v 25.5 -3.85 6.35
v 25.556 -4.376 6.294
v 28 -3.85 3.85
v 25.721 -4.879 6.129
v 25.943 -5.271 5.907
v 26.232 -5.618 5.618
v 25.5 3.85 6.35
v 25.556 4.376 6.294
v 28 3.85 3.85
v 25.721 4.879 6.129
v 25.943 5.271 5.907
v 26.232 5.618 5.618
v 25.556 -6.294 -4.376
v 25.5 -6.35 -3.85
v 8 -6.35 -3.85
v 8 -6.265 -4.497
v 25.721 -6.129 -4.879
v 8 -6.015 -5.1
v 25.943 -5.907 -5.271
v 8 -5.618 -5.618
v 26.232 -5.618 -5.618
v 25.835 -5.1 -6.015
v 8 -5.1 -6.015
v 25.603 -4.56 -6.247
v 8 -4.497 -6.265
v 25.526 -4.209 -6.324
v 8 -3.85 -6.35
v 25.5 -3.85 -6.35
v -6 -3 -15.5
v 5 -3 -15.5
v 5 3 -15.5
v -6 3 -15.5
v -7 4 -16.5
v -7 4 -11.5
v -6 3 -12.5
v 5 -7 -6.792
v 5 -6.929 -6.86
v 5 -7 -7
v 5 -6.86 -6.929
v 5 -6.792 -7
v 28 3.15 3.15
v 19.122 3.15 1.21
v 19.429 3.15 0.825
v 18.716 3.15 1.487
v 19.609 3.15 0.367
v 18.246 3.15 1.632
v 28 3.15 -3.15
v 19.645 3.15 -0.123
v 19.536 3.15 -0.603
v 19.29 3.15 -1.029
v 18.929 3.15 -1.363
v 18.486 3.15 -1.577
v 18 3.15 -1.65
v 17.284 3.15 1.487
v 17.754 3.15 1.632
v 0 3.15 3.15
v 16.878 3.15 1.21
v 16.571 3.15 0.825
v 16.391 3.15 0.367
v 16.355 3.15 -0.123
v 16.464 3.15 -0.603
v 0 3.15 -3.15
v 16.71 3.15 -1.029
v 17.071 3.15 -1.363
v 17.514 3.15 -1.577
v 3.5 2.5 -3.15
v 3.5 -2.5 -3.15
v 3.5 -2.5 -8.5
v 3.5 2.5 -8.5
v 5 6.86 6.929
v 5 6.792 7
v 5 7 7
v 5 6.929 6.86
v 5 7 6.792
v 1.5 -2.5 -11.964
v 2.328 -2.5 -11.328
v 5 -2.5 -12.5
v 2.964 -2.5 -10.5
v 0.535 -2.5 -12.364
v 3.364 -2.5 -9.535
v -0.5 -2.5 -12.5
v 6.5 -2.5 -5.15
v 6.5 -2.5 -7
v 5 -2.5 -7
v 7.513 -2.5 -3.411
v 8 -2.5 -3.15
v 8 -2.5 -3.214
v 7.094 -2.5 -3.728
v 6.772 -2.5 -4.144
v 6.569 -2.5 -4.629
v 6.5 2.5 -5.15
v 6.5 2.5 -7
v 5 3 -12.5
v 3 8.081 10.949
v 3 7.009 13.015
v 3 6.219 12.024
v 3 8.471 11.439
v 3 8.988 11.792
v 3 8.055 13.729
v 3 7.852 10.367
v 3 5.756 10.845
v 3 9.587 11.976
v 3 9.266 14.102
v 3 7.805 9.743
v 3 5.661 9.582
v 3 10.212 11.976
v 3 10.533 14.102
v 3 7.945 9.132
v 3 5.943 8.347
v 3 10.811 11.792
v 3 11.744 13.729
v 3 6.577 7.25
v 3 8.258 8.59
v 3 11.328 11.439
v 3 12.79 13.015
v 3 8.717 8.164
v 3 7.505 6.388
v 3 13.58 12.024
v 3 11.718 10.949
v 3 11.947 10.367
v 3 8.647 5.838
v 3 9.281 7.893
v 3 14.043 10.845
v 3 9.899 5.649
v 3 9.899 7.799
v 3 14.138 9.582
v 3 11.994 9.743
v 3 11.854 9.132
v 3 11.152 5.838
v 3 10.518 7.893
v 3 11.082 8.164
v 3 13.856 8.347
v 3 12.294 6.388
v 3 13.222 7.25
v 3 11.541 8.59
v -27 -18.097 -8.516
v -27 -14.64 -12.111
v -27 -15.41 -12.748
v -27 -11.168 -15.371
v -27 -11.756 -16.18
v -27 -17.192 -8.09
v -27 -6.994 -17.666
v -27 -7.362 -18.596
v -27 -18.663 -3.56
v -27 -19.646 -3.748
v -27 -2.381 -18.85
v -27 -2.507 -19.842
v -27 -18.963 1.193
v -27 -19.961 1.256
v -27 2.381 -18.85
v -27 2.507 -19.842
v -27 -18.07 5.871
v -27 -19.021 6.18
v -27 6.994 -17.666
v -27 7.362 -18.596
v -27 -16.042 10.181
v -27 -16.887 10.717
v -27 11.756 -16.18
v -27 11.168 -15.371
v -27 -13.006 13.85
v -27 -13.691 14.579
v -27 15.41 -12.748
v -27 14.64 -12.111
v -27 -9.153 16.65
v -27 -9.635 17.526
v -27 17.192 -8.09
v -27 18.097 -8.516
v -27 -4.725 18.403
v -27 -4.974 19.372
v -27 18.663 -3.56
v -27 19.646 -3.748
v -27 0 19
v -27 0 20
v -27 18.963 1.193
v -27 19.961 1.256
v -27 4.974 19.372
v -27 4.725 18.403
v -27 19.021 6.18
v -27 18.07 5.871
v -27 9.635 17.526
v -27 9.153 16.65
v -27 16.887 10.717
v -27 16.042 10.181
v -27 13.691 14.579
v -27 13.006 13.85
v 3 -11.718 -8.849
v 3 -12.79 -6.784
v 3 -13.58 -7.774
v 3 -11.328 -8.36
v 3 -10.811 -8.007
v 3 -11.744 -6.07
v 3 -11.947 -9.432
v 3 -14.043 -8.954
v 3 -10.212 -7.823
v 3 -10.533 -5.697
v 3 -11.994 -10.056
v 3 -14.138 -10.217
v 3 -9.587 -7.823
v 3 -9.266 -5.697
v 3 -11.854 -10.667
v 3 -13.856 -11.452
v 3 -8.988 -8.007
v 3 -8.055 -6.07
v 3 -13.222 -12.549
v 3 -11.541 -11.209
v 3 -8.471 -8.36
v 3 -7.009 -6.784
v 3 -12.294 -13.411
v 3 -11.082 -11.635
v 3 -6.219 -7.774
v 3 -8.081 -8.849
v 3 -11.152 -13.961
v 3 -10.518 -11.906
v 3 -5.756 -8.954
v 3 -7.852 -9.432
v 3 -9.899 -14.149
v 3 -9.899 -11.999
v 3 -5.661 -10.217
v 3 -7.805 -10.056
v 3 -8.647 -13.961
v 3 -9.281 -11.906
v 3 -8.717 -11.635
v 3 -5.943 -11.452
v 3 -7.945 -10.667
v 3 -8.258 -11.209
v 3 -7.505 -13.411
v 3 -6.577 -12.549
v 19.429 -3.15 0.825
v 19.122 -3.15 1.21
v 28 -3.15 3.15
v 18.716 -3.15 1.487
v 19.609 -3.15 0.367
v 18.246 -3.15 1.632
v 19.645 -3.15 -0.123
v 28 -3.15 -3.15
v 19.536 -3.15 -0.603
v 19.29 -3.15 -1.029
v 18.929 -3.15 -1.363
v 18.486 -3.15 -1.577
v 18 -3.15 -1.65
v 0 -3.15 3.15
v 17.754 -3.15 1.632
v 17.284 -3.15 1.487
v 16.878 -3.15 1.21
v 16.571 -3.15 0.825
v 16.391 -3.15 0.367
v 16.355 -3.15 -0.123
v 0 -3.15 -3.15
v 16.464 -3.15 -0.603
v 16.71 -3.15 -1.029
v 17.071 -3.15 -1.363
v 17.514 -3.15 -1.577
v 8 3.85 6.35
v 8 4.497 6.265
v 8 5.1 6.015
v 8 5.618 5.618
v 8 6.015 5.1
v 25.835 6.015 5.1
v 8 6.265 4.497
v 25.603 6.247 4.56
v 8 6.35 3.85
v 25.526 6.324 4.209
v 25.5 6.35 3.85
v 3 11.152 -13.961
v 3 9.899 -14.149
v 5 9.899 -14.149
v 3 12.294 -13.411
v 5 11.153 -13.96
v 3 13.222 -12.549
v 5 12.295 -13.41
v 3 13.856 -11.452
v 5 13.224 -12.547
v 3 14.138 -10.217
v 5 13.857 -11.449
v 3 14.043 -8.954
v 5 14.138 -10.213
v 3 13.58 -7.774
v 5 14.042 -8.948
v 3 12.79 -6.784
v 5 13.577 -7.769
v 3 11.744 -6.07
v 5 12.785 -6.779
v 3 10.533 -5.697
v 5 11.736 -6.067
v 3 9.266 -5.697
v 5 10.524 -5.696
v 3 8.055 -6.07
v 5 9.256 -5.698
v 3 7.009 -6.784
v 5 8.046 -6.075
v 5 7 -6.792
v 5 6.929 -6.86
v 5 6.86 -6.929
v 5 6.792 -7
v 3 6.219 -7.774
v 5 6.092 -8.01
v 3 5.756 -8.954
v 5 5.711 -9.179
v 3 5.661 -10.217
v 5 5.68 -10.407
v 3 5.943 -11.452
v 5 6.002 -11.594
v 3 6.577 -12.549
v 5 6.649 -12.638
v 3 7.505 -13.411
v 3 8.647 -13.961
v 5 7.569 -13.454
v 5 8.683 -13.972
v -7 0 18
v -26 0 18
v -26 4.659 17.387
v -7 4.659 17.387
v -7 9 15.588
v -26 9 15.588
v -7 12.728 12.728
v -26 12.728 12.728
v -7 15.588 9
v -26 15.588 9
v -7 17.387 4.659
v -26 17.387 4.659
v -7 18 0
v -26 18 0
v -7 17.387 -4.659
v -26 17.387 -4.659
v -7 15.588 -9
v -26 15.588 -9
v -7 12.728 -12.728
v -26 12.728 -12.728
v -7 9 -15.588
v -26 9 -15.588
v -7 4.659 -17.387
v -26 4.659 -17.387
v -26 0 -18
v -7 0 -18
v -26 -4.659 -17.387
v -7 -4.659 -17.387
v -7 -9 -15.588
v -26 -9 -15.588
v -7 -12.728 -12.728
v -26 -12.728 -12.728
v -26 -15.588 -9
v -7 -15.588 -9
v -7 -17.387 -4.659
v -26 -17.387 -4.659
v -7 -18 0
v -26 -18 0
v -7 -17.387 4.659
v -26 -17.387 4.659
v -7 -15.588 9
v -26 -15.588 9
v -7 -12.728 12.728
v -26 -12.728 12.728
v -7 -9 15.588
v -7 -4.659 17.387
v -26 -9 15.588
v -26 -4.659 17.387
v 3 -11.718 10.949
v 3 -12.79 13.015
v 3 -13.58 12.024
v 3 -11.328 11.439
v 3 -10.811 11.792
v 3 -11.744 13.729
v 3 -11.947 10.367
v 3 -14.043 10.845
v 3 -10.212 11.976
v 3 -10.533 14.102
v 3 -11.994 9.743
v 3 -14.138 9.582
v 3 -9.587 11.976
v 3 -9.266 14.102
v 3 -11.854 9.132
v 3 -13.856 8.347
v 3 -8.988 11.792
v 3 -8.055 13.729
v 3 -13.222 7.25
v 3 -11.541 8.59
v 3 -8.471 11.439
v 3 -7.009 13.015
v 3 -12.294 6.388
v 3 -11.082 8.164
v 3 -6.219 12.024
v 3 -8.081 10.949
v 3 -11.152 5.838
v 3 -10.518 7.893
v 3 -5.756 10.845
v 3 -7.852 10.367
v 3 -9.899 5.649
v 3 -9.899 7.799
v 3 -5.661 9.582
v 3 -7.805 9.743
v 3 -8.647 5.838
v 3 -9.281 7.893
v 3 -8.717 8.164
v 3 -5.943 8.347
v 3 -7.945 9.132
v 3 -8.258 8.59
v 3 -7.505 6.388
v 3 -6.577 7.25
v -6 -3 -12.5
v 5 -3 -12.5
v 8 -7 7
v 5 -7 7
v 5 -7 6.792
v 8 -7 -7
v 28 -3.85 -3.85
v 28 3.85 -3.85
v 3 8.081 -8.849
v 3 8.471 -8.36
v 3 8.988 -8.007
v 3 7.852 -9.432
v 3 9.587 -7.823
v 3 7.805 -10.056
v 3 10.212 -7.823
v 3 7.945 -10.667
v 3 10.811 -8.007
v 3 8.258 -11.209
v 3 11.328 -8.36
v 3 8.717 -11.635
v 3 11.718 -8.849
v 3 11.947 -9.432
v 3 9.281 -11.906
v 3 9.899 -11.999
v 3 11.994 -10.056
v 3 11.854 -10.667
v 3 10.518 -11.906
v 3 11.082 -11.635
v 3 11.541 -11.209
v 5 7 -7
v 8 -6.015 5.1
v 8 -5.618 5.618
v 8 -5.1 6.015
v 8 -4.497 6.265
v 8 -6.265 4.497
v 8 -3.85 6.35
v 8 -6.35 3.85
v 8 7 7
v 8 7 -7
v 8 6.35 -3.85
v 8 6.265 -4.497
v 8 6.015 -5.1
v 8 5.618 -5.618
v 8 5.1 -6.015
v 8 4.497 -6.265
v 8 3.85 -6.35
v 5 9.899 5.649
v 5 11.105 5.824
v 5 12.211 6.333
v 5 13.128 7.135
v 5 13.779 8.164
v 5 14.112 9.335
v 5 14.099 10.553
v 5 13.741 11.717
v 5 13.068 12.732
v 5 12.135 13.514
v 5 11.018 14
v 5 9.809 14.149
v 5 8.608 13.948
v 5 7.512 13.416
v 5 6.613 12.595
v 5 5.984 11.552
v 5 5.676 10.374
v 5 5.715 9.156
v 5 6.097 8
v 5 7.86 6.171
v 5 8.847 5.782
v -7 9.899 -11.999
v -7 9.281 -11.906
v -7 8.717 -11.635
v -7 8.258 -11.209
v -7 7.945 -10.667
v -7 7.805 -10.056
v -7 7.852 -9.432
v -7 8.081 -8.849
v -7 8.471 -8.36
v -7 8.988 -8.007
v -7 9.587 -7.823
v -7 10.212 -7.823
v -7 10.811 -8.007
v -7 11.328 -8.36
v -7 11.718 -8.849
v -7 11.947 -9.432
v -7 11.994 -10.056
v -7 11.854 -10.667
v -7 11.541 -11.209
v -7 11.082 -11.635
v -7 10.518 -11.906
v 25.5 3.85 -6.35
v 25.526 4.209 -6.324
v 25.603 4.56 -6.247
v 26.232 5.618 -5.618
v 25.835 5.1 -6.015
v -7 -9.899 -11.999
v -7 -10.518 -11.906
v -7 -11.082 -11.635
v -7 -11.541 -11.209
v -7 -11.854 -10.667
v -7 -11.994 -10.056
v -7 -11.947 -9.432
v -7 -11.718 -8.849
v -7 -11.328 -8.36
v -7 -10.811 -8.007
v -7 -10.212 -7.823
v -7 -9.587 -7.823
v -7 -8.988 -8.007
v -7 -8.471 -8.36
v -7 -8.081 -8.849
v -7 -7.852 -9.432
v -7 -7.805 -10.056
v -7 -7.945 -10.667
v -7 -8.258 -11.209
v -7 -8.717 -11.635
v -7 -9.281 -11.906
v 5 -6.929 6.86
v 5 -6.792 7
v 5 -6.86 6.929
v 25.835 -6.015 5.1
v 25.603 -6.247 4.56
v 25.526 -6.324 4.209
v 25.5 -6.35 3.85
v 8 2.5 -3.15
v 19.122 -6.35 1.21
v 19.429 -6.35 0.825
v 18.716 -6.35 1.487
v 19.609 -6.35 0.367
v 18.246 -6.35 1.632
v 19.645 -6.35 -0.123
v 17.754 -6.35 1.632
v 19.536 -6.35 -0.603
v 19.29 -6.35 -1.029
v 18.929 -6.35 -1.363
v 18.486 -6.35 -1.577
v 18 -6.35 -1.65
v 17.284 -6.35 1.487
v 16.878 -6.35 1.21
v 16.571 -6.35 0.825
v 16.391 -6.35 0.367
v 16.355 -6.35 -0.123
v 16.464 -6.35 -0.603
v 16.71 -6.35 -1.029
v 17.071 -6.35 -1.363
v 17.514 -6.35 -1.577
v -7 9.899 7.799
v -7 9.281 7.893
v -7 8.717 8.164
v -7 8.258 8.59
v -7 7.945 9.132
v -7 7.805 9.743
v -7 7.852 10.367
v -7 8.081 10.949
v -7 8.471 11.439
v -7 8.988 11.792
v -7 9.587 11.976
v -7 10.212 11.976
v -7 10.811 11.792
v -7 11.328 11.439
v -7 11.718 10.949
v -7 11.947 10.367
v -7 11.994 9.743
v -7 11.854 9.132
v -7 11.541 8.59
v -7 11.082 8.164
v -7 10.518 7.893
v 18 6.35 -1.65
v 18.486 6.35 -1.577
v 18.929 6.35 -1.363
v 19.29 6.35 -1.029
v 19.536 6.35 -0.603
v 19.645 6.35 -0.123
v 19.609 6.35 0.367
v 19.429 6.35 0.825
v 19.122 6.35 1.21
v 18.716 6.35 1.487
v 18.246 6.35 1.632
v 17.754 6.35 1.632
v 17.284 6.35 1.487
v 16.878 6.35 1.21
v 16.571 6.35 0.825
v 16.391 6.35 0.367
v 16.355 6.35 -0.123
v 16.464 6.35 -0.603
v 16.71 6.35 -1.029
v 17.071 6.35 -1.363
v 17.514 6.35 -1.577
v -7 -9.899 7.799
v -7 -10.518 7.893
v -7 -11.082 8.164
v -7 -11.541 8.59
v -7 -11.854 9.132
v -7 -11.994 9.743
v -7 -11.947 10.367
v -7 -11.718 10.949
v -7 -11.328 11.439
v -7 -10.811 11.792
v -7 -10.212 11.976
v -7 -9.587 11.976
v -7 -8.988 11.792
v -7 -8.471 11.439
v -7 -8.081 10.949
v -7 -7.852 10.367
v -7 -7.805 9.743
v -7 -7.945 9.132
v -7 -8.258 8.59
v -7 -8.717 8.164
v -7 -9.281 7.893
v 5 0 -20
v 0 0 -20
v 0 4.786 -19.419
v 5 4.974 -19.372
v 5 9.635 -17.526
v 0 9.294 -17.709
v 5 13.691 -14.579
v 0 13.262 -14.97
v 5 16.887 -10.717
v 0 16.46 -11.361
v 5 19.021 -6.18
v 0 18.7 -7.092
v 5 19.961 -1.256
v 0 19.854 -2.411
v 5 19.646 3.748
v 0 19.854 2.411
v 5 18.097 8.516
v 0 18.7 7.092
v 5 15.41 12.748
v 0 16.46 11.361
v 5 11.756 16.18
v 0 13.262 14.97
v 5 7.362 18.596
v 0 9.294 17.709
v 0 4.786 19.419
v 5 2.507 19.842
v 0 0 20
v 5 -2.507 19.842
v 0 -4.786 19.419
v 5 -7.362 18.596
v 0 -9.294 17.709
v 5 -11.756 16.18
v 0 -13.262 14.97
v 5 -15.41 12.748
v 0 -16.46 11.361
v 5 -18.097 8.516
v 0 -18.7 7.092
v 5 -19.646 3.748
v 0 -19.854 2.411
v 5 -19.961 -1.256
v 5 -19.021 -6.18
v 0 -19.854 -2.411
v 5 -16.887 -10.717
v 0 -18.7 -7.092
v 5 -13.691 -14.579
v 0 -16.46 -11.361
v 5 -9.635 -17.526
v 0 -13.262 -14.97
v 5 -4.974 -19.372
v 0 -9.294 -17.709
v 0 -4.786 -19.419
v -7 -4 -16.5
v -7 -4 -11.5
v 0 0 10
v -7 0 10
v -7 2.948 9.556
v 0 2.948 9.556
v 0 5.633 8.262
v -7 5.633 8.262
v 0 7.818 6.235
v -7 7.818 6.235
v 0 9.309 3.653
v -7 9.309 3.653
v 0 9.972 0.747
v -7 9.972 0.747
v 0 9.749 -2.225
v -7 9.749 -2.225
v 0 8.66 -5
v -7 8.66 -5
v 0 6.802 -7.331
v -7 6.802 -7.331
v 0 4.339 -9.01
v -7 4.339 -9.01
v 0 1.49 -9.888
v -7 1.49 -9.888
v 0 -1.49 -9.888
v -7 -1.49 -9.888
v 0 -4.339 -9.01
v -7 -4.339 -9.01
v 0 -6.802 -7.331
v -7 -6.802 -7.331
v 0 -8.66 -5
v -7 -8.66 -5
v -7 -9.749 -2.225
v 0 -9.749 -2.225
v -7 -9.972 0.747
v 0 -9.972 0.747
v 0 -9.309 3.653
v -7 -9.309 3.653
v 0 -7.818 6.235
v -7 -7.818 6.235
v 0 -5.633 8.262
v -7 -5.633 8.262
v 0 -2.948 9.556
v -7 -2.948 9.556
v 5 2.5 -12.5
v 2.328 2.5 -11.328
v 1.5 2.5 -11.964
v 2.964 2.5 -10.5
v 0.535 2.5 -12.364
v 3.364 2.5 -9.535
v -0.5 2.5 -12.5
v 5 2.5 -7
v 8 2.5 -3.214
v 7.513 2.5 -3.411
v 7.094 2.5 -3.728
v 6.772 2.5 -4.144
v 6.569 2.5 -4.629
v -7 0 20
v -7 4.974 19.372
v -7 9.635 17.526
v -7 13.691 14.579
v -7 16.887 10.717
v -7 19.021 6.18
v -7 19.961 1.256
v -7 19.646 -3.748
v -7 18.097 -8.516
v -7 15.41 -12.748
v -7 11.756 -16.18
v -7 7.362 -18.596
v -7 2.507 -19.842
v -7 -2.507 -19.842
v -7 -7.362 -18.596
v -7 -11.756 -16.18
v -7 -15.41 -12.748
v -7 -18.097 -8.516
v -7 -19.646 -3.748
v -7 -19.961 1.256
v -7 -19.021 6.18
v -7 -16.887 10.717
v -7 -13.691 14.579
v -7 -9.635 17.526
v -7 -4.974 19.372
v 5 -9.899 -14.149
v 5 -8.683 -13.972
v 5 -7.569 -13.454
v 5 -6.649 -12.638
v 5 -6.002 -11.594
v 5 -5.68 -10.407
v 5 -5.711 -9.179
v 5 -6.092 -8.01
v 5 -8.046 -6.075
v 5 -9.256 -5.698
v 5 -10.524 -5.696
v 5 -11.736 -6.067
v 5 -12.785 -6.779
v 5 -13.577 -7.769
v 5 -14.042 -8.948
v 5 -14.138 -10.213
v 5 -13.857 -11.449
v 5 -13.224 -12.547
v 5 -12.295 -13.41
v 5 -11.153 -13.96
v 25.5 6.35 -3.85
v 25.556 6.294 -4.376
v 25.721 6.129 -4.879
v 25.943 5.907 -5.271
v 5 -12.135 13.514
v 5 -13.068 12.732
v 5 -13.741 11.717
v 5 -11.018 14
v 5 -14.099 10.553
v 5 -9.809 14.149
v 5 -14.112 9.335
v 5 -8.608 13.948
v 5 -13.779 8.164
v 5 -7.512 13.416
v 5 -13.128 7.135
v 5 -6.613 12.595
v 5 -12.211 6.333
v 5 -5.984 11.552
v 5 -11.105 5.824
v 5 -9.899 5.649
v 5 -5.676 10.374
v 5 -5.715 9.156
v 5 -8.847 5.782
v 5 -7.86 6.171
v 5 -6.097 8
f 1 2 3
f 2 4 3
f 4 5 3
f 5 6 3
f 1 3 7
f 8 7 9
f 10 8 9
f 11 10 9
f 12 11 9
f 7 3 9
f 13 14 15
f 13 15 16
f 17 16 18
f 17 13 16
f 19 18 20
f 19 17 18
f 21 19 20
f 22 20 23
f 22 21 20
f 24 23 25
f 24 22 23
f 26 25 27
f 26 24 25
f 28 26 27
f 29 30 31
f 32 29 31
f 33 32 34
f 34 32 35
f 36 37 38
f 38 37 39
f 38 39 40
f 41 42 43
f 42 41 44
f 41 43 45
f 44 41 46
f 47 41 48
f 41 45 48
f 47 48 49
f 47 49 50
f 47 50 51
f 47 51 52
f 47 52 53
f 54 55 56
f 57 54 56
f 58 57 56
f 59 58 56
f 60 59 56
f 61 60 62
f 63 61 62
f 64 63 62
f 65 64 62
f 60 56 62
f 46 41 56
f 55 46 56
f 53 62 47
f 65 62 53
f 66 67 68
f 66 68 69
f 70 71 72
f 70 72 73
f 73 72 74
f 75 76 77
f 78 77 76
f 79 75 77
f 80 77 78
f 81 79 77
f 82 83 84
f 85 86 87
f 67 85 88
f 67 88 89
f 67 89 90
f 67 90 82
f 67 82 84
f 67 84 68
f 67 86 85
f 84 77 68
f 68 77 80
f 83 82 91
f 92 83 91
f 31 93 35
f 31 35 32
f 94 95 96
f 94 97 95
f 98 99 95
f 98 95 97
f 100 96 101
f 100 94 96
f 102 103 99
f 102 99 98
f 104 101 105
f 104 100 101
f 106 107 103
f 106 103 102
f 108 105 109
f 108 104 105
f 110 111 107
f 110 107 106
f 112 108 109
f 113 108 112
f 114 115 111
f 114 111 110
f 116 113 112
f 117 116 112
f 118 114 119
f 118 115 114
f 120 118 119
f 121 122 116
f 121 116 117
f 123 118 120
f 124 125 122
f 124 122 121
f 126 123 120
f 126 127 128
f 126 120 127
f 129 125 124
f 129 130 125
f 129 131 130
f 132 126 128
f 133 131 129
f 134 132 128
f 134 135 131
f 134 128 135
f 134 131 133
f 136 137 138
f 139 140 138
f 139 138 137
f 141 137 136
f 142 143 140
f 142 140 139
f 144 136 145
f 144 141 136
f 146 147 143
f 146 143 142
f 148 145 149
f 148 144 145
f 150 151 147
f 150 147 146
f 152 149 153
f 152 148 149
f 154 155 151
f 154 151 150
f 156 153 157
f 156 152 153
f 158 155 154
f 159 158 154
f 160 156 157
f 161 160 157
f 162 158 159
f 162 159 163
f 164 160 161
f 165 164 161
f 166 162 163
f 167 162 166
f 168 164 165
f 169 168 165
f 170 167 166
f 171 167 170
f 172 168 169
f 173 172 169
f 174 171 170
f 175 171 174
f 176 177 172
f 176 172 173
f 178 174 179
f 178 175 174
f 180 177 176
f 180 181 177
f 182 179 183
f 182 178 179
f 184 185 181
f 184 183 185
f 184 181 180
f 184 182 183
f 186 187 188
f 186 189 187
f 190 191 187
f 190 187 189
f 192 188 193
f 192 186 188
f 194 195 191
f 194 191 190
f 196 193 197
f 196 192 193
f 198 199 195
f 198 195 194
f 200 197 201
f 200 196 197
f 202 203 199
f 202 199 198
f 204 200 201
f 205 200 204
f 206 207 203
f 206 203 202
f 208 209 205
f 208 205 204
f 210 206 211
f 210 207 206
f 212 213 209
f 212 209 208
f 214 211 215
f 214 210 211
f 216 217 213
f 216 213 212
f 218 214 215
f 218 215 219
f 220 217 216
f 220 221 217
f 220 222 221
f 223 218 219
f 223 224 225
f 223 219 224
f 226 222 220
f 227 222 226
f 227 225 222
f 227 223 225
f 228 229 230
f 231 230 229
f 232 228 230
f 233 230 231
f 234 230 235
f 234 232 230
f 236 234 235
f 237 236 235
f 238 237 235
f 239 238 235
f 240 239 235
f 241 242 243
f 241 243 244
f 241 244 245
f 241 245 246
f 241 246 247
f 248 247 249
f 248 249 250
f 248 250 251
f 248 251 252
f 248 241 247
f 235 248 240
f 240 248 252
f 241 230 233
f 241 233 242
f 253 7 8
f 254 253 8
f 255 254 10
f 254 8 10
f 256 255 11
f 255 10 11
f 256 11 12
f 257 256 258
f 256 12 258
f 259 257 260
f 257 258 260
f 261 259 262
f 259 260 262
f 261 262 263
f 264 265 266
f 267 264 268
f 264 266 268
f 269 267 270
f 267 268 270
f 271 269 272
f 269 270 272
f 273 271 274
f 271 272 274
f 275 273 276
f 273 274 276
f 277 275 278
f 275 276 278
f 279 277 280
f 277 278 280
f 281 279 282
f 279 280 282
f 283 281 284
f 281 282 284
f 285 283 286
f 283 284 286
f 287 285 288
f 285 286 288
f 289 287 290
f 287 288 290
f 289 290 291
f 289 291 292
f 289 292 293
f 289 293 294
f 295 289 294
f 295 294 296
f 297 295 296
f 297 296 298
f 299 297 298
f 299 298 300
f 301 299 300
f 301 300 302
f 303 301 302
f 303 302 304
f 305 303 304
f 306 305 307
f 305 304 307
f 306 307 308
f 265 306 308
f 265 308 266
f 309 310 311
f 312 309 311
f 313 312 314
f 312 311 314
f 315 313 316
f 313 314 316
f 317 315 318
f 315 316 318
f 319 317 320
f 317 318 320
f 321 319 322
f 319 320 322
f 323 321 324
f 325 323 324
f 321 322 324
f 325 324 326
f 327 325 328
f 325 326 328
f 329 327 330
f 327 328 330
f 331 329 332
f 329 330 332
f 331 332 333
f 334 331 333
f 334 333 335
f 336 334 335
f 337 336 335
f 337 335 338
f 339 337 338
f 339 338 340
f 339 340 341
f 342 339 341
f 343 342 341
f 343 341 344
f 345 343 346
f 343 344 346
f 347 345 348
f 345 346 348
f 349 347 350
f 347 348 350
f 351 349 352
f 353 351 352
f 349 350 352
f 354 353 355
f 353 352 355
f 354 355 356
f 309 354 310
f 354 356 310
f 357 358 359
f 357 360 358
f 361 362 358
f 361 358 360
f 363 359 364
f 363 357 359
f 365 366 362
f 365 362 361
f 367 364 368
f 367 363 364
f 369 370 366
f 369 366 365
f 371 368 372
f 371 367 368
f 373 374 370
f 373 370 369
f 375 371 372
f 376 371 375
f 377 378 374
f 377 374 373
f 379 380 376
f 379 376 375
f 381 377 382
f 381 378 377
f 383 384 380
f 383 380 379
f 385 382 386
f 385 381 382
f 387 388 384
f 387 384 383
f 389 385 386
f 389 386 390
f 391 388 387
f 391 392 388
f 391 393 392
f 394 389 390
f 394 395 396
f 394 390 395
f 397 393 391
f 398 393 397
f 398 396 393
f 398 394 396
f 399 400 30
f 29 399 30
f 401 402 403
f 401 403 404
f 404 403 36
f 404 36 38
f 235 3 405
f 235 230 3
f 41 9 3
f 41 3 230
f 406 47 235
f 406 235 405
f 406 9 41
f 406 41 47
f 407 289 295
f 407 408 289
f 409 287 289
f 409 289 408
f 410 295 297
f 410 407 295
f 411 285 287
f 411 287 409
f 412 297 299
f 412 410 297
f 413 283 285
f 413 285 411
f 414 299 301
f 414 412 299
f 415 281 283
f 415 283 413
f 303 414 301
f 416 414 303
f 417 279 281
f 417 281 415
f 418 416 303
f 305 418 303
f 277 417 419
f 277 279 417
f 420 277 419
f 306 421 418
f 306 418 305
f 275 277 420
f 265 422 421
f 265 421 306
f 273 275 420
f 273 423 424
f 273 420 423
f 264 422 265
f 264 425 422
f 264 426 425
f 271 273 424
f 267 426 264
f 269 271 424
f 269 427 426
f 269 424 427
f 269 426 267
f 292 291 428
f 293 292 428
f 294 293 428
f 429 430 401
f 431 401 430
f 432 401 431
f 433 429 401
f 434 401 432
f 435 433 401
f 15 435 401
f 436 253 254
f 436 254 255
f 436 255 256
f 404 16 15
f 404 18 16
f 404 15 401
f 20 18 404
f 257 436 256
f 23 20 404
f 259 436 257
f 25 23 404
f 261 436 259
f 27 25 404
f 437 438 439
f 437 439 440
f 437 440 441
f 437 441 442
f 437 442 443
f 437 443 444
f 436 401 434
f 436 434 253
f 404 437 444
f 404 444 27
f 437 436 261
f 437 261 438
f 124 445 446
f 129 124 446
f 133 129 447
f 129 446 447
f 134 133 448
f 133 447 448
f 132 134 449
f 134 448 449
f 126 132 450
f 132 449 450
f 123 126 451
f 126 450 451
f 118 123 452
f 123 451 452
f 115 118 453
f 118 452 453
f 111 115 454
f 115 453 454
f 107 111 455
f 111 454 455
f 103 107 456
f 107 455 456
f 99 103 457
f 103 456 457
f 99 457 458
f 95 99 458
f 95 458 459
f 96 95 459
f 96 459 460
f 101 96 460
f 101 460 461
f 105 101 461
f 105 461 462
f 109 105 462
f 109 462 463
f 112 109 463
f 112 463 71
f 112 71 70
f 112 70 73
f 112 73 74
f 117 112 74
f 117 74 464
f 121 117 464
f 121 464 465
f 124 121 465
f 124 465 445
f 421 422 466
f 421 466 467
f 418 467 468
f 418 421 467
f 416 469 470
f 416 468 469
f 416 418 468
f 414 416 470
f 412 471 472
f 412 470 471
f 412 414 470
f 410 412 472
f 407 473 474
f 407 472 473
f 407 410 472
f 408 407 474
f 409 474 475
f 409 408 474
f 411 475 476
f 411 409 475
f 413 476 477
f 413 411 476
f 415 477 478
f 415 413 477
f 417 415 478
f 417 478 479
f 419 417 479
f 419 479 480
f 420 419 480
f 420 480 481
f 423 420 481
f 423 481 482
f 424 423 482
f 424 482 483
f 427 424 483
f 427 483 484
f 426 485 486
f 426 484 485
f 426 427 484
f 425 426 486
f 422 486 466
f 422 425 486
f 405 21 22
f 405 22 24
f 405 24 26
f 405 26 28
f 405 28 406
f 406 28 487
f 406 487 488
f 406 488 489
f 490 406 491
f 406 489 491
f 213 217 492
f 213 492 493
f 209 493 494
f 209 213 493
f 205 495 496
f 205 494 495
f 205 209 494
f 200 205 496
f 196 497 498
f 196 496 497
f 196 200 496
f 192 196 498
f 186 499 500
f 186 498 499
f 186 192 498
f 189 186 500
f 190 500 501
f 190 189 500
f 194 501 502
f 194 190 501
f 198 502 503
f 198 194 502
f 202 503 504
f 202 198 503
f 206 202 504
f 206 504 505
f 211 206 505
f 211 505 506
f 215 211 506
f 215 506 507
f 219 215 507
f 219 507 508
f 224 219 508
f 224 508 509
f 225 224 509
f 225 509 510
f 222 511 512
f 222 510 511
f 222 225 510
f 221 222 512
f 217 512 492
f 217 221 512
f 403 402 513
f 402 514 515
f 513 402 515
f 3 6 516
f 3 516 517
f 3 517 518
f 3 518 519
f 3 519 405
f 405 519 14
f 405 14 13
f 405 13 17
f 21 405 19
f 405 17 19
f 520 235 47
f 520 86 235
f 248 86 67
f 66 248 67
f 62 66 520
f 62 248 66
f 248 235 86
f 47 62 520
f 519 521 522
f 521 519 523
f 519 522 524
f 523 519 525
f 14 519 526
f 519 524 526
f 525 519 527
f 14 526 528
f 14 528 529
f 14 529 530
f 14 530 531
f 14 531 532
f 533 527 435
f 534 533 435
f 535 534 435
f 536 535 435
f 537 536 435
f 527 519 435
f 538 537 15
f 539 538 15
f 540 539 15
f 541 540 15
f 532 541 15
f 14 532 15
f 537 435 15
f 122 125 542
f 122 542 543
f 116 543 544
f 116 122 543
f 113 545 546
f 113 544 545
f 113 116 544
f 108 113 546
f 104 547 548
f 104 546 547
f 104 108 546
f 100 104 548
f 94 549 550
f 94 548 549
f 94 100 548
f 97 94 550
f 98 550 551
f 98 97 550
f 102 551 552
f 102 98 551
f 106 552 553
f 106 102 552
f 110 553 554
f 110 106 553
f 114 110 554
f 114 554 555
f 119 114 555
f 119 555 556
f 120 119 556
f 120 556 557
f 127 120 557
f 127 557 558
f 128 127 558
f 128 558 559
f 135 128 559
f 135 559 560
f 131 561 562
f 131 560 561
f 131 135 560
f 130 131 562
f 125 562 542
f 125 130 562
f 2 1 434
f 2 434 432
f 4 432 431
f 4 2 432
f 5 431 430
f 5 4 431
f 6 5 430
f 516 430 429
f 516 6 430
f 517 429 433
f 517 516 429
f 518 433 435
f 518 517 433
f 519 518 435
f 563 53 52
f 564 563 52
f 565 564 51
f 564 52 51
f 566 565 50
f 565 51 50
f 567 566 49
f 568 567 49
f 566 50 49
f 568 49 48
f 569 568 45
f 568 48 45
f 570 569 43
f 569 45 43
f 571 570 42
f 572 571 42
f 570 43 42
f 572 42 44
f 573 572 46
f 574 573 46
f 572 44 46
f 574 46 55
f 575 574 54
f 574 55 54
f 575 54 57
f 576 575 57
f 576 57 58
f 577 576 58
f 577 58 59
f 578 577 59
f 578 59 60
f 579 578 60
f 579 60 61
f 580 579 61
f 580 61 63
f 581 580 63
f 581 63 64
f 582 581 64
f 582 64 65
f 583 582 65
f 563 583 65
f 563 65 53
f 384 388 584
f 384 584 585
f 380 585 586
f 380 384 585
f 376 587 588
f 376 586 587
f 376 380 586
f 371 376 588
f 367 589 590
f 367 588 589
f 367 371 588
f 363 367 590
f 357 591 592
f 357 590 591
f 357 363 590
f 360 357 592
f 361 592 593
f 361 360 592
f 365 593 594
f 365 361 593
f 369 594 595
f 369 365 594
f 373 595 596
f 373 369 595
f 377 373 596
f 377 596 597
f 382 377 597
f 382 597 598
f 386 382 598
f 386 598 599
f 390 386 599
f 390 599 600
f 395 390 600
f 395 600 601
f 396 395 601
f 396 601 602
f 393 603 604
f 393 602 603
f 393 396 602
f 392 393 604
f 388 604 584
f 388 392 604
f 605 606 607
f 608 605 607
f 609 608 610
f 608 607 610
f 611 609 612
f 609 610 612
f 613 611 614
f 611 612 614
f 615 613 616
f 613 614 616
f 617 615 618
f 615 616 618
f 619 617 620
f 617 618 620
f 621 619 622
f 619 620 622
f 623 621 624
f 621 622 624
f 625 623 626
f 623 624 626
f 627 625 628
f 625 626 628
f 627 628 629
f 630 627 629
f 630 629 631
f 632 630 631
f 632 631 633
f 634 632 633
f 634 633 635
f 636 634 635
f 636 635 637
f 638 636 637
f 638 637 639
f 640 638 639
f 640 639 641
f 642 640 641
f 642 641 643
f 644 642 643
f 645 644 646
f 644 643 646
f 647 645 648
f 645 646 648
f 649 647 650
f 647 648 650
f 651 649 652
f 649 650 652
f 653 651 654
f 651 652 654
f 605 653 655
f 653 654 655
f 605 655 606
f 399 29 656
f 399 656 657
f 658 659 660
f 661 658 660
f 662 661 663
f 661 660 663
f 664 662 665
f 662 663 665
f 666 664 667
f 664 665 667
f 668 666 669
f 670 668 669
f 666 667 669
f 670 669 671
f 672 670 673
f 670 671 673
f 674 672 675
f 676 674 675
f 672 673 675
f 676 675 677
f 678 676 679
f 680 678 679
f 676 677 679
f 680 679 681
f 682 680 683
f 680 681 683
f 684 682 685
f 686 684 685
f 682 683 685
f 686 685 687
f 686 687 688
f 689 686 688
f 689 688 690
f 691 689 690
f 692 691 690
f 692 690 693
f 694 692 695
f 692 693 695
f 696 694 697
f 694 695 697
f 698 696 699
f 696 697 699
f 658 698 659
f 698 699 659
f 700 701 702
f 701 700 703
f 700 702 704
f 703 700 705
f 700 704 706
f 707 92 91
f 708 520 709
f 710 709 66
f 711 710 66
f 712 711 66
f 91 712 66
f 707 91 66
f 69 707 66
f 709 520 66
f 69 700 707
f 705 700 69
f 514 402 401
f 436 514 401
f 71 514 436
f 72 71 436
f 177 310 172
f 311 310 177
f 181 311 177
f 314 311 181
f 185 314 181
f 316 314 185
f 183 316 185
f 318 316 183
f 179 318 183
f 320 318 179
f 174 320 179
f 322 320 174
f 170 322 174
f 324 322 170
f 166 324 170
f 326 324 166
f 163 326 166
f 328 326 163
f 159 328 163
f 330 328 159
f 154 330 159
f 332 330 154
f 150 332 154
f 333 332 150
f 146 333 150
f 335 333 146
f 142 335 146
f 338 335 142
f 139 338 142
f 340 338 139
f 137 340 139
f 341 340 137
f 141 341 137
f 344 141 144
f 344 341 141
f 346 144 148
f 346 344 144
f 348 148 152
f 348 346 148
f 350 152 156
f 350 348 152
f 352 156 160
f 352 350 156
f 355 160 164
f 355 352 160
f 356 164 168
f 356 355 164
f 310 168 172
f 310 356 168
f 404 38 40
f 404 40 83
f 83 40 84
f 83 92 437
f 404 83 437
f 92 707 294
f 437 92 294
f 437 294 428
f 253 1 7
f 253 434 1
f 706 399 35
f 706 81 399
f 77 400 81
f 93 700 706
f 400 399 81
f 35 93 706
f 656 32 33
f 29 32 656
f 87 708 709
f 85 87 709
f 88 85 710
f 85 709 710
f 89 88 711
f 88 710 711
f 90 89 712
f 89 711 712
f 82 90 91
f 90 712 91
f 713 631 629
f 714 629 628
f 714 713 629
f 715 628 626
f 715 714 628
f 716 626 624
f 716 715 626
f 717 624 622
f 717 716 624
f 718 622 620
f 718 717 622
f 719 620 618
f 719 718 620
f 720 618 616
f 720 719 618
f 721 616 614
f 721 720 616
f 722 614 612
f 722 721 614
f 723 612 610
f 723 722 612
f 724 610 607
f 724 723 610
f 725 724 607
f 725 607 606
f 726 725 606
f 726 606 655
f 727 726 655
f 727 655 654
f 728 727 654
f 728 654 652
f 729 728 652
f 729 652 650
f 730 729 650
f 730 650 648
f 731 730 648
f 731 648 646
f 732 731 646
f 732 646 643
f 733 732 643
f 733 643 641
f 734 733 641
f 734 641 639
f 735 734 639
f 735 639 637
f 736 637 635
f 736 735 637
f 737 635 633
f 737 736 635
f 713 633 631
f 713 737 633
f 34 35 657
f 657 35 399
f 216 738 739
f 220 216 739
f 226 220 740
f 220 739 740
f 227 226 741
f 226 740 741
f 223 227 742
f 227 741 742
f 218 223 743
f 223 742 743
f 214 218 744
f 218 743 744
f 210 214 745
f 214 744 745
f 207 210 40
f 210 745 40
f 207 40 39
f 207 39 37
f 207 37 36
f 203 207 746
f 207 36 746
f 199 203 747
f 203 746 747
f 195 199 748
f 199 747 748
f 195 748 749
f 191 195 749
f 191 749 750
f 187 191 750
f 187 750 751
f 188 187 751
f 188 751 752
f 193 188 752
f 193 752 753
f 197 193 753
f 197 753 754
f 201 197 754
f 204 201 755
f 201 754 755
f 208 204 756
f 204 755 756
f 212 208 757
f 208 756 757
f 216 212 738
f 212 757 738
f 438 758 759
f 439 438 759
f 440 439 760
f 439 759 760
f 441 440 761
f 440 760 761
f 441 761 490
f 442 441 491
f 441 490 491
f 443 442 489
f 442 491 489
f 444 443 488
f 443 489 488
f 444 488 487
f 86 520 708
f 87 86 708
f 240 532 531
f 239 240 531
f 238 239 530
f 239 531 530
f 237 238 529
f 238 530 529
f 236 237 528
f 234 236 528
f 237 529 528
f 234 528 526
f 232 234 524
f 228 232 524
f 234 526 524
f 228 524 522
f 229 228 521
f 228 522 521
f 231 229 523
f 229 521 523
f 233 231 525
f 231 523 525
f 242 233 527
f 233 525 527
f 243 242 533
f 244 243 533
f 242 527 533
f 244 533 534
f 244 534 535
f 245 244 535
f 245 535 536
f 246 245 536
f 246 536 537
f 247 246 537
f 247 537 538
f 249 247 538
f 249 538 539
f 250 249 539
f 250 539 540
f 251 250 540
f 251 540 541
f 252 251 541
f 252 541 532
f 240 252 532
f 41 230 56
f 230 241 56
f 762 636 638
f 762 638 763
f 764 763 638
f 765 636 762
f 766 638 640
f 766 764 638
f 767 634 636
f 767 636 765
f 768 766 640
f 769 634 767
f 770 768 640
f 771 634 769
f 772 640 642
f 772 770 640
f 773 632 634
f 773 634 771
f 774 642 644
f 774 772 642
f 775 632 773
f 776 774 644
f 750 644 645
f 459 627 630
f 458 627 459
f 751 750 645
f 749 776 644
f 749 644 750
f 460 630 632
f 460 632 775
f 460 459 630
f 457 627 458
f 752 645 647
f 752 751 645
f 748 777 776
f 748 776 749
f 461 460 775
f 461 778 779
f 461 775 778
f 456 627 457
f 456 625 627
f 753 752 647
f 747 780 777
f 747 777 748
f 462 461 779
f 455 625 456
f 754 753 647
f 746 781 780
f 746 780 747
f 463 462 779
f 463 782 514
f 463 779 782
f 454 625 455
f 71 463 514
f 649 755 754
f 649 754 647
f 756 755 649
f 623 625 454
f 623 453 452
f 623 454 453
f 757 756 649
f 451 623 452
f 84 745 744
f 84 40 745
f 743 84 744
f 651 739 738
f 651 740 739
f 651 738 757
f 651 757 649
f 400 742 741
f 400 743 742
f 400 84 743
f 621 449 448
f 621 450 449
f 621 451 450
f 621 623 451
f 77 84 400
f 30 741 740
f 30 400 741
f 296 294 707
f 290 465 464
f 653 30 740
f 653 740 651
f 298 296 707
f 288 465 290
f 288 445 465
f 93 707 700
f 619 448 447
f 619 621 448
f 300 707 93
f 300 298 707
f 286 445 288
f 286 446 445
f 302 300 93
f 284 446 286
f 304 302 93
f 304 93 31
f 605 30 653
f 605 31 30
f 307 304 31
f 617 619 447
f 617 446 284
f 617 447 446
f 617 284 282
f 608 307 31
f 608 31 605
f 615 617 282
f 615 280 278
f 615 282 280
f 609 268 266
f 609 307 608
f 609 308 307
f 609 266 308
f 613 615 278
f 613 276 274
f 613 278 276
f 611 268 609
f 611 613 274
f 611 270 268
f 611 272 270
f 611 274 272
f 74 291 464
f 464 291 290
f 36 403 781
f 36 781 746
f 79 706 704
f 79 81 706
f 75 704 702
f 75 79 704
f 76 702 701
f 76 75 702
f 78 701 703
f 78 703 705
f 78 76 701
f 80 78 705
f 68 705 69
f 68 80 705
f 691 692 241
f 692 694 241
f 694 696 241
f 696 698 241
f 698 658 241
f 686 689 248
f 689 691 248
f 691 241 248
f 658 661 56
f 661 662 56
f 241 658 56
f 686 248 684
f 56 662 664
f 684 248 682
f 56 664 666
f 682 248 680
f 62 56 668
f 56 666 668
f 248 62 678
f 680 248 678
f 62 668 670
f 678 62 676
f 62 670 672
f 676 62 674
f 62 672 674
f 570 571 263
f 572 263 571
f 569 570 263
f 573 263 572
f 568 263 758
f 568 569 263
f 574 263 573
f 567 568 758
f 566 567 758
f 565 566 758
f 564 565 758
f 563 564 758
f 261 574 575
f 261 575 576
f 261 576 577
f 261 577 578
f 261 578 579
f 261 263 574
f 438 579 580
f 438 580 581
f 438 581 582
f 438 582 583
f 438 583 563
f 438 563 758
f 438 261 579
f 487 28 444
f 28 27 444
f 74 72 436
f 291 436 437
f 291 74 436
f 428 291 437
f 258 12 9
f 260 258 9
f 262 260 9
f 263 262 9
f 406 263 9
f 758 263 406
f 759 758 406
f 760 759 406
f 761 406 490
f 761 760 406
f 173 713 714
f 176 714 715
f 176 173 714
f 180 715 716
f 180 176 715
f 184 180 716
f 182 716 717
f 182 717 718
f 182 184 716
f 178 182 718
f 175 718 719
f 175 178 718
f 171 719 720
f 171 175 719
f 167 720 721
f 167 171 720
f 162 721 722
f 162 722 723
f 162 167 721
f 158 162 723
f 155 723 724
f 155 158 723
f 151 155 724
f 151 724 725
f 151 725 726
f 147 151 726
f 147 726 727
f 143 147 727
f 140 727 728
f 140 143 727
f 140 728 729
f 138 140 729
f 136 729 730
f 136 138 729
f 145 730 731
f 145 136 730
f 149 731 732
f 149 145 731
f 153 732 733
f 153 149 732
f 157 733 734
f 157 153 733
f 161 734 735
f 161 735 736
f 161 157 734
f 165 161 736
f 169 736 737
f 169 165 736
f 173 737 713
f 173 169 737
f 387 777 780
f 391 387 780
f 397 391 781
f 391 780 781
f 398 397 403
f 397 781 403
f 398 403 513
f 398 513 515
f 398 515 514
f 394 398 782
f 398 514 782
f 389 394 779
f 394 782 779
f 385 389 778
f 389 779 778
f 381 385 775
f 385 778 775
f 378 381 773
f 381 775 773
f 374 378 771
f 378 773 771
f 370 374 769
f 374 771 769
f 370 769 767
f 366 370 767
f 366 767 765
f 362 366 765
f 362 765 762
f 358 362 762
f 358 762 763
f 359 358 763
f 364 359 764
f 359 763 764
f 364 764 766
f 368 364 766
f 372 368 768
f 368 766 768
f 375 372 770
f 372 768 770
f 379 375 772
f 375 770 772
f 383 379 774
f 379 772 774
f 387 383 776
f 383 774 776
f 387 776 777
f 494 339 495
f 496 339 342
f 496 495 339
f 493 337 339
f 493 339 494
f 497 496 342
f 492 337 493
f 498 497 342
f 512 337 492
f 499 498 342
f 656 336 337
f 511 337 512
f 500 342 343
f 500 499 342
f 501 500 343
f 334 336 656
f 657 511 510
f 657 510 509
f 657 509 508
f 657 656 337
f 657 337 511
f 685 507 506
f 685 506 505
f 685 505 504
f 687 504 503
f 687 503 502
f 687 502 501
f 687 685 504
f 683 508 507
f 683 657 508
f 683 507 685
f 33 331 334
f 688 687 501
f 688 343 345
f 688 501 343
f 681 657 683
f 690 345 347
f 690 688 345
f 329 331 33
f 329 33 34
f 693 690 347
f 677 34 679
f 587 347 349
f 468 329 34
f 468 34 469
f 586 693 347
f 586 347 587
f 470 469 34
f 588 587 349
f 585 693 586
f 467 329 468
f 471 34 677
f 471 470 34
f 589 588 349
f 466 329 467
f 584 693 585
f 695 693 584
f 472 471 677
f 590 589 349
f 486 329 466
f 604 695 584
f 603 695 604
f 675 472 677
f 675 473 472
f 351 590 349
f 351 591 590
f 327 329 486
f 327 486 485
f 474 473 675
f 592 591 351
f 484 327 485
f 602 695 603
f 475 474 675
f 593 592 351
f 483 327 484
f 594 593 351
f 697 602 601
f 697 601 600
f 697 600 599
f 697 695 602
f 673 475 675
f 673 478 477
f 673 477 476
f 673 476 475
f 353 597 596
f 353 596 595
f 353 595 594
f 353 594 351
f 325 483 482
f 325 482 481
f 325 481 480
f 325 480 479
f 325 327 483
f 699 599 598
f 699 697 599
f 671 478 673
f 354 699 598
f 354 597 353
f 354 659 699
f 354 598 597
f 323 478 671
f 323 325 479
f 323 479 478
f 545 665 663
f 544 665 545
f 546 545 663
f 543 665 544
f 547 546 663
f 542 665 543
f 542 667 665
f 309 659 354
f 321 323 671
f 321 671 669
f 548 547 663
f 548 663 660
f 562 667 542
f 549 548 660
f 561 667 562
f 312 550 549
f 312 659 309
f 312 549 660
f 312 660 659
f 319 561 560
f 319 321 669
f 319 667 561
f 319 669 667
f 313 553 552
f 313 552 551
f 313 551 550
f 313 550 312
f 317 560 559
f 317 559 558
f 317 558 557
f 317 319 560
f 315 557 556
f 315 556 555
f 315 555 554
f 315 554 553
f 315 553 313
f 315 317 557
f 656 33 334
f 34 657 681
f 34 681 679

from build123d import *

# Parameters (mm, degrees)
SKETCH_1_R               = 20
EXTRUDE_1_DEPTH          = 5
SKETCH_2_W               = 6.3
SKETCH_2_H               = 6.3
CUT_EXTRUDE_1_DEPTH      = 5
EXTRUDE_START            = 7
SKETCH_4_R               = 20
SKETCH_4_R_2             = 10
EXTRUDE_2_DEPTH          = 7
CUT_EXTRUDE_2_DEPTH      = 20
CUT_EXTRUDE_2_DEPTH_BACK = 20
SKETCH_3_R               = 2.1
SKETCH_5_W               = 3
SKETCH_5_H               = 6
CUT_EXTRUDE_3_DEPTH      = 13
CHAMFER_1_SIZE           = 1
EXTRUDE_START_2          = 20
SKETCH_6_R               = 20
SKETCH_6_R_2             = 18
EXTRUDE_3_DEPTH          = 20
CHAMFER_2_SIZE           = 1
SKETCH_7_R               = 4.25
CUT_EXTRUDE_4_DEPTH      = 2
SKETCH_8_W               = 14
SKETCH_8_H               = 14
EXTRUDE_4_DEPTH          = 3
SKETCH_9_W               = 6.3
SKETCH_9_H               = 6.3
CUT_EXTRUDE_5_DEPTH      = 10
CUT_EXTRUDE_6_DEPTH      = 6
CUT_EXTRUDE_6_DEPTH_BACK = 5
SKETCH_10_W              = 3
SKETCH_10_H              = 5
FILLET_1_R               = 4
FILLET_2_R               = 2
SKETCH_11_W              = 12.7
SKETCH_11_H              = 12.7
SKETCH_11_W_2            = 6.3
SKETCH_11_H_2            = 6.3
EXTRUDE_5_DEPTH          = 20
CHAMFER_3_SIZE           = 2.5
SKETCH_12_R              = 1.65
CUT_EXTRUDE_7_DEPTH      = 20
FILLET_3_R               = 2.5


with BuildPart() as part:
    # 草图1 → 凸台-拉伸1 (new body)
    with BuildSketch(Plane(origin=(0, 0, 0), x_dir=(0, 0, -1), z_dir=(1, 0, 0))):
        Circle(SKETCH_1_R)
    extrude(amount=EXTRUDE_1_DEPTH)

    # 草图2 → 切除-拉伸1 (cut)
    with BuildSketch(Plane(origin=(5, 0, 0), x_dir=(0, 0, -1), z_dir=(1, 0, 0))):
        Rectangle(SKETCH_2_W, SKETCH_2_H)
    extrude(amount=-CUT_EXTRUDE_1_DEPTH, mode=Mode.SUBTRACT)

    # 草图4 → 凸台-拉伸2 (add)
    with BuildSketch(Plane.ZY.offset(EXTRUDE_START)):
        Circle(SKETCH_4_R)
        Circle(SKETCH_4_R_2, mode=Mode.SUBTRACT)
    extrude(amount=-EXTRUDE_2_DEPTH)

    # 草图3 → 切除-拉伸2 (cut, two sides: drawn at the far end of the back side and taken through both)
    with BuildSketch(Plane.ZY.offset(-CUT_EXTRUDE_2_DEPTH_BACK)):
        with Locations(Location((9.899494937, -9.899494937, 0), (0, 0, 180))):
            Circle(SKETCH_3_R)
        with Locations(Location((-9.899494937, -9.899494937, 0), (0, 0, 180))):
            Circle(SKETCH_3_R)
        with Locations(Location((-9.899494937, 9.899494937, 0), (0, 0, 180))):
            Circle(SKETCH_3_R)
        with Locations(Location((9.899494937, 9.899494937, 0), (0, 0, 180))):
            Circle(SKETCH_3_R)
    extrude(amount=CUT_EXTRUDE_2_DEPTH + CUT_EXTRUDE_2_DEPTH_BACK, mode=Mode.SUBTRACT)

    # 草图5 → 切除-拉伸3 (cut)
    with BuildSketch(Plane(origin=(5, 0, 0), x_dir=(0, 0, -1), z_dir=(1, 0, 0))):
        with Locations((14, 0)):
            Rectangle(SKETCH_5_W, SKETCH_5_H)
    extrude(amount=-CUT_EXTRUDE_3_DEPTH, mode=Mode.SUBTRACT)

    # 倒角1
    chamfer_1_edges = [part.edges().sort_by_distance(p)[0] for p in [
        (-7, -3, -14),
        (-7, 0, -15.5),
        (-7, 3, -14),
        (-7, 0, -12.5),
    ]]
    chamfer(chamfer_1_edges, length=CHAMFER_1_SIZE)

    # 草图6 → 凸台-拉伸3 (add)
    with BuildSketch(Plane.ZY.offset(7).offset(EXTRUDE_START_2)):
        Circle(SKETCH_6_R)
        Circle(SKETCH_6_R_2, mode=Mode.SUBTRACT)
    extrude(amount=-EXTRUDE_3_DEPTH)

    # 倒角2
    chamfer_2_edges = [part.edges().sort_by_distance(p)[0] for p in [
        (-27, 0, -18),
    ]]
    chamfer(chamfer_2_edges, length=CHAMFER_2_SIZE)

    # 草图7 → 切除-拉伸4 (cut)
    with BuildSketch(Plane(origin=(5, 0, 0), x_dir=(0, 0, -1), z_dir=(1, 0, 0))):
        with Locations((-9.899494937, 9.899494937)):
            Circle(SKETCH_7_R)
        with Locations((9.899494937, 9.899494937)):
            Circle(SKETCH_7_R)
        with Locations((9.899494937, -9.899494937)):
            Circle(SKETCH_7_R)
        with Locations((-9.899494937, -9.899494937)):
            Circle(SKETCH_7_R)
    extrude(amount=-CUT_EXTRUDE_4_DEPTH, mode=Mode.SUBTRACT)

    # 草图8 → 凸台-拉伸4 (add)
    with BuildSketch(Plane(origin=(5, 0, 0), x_dir=(0, 0, -1), z_dir=(1, 0, 0))):
        Rectangle(SKETCH_8_W, SKETCH_8_H)
    extrude(amount=EXTRUDE_4_DEPTH)

    # 草图9 → 切除-拉伸5 (cut)
    with BuildSketch(Plane.ZY.offset(-5)):
        Rectangle(SKETCH_9_W, SKETCH_9_H)
    extrude(amount=-CUT_EXTRUDE_5_DEPTH, mode=Mode.SUBTRACT)

    # 草图10 → 切除-拉伸6 (cut, two sides: drawn at the far end of the back side and taken through both)
    with BuildSketch(Plane(origin=(0, 0, -7), x_dir=(-1, 0, 0), z_dir=(0, 0, -1)).offset(-CUT_EXTRUDE_6_DEPTH_BACK)):
        with Locations((-5, 0)):
            Rectangle(SKETCH_10_W, SKETCH_10_H)
    extrude(amount=CUT_EXTRUDE_6_DEPTH + CUT_EXTRUDE_6_DEPTH_BACK, mode=Mode.SUBTRACT)

    # 圆角1
    fillet_1_edges = [part.edges().sort_by_distance(p)[0] for p in [
        (3.5, 0, -12.5),
    ]]
    fillet(fillet_1_edges, radius=FILLET_1_R)

    # 圆角2
    # the kernel refuses this fillet: 2 mm, written as the material it takes off along each edge
    with BuildSketch(Plane(origin=(6.5, 2.5, -3.15), x_dir=(1, 0, 0), z_dir=(0, -1, 0))) as fillet_2_piece_1:
        with BuildLine():
            CenterArc((FILLET_2_R, -FILLET_2_R), FILLET_2_R, 90, 90)
            Line((0, -FILLET_2_R), (0, 0))
            Line((0, 0), (FILLET_2_R, 0))
        make_face()
    extrude(amount=5, mode=Mode.SUBTRACT)

    # 草图11 → 凸台-拉伸5 (add)
    with BuildSketch(Plane(origin=(8, 0, 0), x_dir=(0, 0, -1), z_dir=(1, 0, 0))):
        Rectangle(SKETCH_11_W, SKETCH_11_H)
        Rectangle(SKETCH_11_W_2, SKETCH_11_H_2, mode=Mode.SUBTRACT)
    extrude(amount=EXTRUDE_5_DEPTH)

    # 倒角3
    chamfer_3_edges = [part.edges().sort_by_distance(p)[0] for p in [
        (28, 0, 6.35),
        (28, -6.35, 0),
        (28, 0, -6.35),
        (28, 6.35, 0),
    ]]
    chamfer(chamfer_3_edges, length=CHAMFER_3_SIZE)

    # 草图12 → 切除-拉伸7 (cut)
    with BuildSketch(Plane.XZ.offset(6.35)):
        with Locations(Location((18, 0, 0), (0, 0, 270))):
            Circle(SKETCH_12_R)
    extrude(amount=-CUT_EXTRUDE_7_DEPTH, mode=Mode.SUBTRACT)

    # 圆角3
    fillet_3_edges = [part.edges().sort_by_distance(p)[0] for p in [
        (16.75, 6.35, 6.35),
        (16.75, 6.35, -6.35),
        (16.75, -6.35, -6.35),
        (16.75, -6.35, 6.35),
    ]]
    fillet(fillet_3_edges, radius=FILLET_3_R)


solid = part.part
